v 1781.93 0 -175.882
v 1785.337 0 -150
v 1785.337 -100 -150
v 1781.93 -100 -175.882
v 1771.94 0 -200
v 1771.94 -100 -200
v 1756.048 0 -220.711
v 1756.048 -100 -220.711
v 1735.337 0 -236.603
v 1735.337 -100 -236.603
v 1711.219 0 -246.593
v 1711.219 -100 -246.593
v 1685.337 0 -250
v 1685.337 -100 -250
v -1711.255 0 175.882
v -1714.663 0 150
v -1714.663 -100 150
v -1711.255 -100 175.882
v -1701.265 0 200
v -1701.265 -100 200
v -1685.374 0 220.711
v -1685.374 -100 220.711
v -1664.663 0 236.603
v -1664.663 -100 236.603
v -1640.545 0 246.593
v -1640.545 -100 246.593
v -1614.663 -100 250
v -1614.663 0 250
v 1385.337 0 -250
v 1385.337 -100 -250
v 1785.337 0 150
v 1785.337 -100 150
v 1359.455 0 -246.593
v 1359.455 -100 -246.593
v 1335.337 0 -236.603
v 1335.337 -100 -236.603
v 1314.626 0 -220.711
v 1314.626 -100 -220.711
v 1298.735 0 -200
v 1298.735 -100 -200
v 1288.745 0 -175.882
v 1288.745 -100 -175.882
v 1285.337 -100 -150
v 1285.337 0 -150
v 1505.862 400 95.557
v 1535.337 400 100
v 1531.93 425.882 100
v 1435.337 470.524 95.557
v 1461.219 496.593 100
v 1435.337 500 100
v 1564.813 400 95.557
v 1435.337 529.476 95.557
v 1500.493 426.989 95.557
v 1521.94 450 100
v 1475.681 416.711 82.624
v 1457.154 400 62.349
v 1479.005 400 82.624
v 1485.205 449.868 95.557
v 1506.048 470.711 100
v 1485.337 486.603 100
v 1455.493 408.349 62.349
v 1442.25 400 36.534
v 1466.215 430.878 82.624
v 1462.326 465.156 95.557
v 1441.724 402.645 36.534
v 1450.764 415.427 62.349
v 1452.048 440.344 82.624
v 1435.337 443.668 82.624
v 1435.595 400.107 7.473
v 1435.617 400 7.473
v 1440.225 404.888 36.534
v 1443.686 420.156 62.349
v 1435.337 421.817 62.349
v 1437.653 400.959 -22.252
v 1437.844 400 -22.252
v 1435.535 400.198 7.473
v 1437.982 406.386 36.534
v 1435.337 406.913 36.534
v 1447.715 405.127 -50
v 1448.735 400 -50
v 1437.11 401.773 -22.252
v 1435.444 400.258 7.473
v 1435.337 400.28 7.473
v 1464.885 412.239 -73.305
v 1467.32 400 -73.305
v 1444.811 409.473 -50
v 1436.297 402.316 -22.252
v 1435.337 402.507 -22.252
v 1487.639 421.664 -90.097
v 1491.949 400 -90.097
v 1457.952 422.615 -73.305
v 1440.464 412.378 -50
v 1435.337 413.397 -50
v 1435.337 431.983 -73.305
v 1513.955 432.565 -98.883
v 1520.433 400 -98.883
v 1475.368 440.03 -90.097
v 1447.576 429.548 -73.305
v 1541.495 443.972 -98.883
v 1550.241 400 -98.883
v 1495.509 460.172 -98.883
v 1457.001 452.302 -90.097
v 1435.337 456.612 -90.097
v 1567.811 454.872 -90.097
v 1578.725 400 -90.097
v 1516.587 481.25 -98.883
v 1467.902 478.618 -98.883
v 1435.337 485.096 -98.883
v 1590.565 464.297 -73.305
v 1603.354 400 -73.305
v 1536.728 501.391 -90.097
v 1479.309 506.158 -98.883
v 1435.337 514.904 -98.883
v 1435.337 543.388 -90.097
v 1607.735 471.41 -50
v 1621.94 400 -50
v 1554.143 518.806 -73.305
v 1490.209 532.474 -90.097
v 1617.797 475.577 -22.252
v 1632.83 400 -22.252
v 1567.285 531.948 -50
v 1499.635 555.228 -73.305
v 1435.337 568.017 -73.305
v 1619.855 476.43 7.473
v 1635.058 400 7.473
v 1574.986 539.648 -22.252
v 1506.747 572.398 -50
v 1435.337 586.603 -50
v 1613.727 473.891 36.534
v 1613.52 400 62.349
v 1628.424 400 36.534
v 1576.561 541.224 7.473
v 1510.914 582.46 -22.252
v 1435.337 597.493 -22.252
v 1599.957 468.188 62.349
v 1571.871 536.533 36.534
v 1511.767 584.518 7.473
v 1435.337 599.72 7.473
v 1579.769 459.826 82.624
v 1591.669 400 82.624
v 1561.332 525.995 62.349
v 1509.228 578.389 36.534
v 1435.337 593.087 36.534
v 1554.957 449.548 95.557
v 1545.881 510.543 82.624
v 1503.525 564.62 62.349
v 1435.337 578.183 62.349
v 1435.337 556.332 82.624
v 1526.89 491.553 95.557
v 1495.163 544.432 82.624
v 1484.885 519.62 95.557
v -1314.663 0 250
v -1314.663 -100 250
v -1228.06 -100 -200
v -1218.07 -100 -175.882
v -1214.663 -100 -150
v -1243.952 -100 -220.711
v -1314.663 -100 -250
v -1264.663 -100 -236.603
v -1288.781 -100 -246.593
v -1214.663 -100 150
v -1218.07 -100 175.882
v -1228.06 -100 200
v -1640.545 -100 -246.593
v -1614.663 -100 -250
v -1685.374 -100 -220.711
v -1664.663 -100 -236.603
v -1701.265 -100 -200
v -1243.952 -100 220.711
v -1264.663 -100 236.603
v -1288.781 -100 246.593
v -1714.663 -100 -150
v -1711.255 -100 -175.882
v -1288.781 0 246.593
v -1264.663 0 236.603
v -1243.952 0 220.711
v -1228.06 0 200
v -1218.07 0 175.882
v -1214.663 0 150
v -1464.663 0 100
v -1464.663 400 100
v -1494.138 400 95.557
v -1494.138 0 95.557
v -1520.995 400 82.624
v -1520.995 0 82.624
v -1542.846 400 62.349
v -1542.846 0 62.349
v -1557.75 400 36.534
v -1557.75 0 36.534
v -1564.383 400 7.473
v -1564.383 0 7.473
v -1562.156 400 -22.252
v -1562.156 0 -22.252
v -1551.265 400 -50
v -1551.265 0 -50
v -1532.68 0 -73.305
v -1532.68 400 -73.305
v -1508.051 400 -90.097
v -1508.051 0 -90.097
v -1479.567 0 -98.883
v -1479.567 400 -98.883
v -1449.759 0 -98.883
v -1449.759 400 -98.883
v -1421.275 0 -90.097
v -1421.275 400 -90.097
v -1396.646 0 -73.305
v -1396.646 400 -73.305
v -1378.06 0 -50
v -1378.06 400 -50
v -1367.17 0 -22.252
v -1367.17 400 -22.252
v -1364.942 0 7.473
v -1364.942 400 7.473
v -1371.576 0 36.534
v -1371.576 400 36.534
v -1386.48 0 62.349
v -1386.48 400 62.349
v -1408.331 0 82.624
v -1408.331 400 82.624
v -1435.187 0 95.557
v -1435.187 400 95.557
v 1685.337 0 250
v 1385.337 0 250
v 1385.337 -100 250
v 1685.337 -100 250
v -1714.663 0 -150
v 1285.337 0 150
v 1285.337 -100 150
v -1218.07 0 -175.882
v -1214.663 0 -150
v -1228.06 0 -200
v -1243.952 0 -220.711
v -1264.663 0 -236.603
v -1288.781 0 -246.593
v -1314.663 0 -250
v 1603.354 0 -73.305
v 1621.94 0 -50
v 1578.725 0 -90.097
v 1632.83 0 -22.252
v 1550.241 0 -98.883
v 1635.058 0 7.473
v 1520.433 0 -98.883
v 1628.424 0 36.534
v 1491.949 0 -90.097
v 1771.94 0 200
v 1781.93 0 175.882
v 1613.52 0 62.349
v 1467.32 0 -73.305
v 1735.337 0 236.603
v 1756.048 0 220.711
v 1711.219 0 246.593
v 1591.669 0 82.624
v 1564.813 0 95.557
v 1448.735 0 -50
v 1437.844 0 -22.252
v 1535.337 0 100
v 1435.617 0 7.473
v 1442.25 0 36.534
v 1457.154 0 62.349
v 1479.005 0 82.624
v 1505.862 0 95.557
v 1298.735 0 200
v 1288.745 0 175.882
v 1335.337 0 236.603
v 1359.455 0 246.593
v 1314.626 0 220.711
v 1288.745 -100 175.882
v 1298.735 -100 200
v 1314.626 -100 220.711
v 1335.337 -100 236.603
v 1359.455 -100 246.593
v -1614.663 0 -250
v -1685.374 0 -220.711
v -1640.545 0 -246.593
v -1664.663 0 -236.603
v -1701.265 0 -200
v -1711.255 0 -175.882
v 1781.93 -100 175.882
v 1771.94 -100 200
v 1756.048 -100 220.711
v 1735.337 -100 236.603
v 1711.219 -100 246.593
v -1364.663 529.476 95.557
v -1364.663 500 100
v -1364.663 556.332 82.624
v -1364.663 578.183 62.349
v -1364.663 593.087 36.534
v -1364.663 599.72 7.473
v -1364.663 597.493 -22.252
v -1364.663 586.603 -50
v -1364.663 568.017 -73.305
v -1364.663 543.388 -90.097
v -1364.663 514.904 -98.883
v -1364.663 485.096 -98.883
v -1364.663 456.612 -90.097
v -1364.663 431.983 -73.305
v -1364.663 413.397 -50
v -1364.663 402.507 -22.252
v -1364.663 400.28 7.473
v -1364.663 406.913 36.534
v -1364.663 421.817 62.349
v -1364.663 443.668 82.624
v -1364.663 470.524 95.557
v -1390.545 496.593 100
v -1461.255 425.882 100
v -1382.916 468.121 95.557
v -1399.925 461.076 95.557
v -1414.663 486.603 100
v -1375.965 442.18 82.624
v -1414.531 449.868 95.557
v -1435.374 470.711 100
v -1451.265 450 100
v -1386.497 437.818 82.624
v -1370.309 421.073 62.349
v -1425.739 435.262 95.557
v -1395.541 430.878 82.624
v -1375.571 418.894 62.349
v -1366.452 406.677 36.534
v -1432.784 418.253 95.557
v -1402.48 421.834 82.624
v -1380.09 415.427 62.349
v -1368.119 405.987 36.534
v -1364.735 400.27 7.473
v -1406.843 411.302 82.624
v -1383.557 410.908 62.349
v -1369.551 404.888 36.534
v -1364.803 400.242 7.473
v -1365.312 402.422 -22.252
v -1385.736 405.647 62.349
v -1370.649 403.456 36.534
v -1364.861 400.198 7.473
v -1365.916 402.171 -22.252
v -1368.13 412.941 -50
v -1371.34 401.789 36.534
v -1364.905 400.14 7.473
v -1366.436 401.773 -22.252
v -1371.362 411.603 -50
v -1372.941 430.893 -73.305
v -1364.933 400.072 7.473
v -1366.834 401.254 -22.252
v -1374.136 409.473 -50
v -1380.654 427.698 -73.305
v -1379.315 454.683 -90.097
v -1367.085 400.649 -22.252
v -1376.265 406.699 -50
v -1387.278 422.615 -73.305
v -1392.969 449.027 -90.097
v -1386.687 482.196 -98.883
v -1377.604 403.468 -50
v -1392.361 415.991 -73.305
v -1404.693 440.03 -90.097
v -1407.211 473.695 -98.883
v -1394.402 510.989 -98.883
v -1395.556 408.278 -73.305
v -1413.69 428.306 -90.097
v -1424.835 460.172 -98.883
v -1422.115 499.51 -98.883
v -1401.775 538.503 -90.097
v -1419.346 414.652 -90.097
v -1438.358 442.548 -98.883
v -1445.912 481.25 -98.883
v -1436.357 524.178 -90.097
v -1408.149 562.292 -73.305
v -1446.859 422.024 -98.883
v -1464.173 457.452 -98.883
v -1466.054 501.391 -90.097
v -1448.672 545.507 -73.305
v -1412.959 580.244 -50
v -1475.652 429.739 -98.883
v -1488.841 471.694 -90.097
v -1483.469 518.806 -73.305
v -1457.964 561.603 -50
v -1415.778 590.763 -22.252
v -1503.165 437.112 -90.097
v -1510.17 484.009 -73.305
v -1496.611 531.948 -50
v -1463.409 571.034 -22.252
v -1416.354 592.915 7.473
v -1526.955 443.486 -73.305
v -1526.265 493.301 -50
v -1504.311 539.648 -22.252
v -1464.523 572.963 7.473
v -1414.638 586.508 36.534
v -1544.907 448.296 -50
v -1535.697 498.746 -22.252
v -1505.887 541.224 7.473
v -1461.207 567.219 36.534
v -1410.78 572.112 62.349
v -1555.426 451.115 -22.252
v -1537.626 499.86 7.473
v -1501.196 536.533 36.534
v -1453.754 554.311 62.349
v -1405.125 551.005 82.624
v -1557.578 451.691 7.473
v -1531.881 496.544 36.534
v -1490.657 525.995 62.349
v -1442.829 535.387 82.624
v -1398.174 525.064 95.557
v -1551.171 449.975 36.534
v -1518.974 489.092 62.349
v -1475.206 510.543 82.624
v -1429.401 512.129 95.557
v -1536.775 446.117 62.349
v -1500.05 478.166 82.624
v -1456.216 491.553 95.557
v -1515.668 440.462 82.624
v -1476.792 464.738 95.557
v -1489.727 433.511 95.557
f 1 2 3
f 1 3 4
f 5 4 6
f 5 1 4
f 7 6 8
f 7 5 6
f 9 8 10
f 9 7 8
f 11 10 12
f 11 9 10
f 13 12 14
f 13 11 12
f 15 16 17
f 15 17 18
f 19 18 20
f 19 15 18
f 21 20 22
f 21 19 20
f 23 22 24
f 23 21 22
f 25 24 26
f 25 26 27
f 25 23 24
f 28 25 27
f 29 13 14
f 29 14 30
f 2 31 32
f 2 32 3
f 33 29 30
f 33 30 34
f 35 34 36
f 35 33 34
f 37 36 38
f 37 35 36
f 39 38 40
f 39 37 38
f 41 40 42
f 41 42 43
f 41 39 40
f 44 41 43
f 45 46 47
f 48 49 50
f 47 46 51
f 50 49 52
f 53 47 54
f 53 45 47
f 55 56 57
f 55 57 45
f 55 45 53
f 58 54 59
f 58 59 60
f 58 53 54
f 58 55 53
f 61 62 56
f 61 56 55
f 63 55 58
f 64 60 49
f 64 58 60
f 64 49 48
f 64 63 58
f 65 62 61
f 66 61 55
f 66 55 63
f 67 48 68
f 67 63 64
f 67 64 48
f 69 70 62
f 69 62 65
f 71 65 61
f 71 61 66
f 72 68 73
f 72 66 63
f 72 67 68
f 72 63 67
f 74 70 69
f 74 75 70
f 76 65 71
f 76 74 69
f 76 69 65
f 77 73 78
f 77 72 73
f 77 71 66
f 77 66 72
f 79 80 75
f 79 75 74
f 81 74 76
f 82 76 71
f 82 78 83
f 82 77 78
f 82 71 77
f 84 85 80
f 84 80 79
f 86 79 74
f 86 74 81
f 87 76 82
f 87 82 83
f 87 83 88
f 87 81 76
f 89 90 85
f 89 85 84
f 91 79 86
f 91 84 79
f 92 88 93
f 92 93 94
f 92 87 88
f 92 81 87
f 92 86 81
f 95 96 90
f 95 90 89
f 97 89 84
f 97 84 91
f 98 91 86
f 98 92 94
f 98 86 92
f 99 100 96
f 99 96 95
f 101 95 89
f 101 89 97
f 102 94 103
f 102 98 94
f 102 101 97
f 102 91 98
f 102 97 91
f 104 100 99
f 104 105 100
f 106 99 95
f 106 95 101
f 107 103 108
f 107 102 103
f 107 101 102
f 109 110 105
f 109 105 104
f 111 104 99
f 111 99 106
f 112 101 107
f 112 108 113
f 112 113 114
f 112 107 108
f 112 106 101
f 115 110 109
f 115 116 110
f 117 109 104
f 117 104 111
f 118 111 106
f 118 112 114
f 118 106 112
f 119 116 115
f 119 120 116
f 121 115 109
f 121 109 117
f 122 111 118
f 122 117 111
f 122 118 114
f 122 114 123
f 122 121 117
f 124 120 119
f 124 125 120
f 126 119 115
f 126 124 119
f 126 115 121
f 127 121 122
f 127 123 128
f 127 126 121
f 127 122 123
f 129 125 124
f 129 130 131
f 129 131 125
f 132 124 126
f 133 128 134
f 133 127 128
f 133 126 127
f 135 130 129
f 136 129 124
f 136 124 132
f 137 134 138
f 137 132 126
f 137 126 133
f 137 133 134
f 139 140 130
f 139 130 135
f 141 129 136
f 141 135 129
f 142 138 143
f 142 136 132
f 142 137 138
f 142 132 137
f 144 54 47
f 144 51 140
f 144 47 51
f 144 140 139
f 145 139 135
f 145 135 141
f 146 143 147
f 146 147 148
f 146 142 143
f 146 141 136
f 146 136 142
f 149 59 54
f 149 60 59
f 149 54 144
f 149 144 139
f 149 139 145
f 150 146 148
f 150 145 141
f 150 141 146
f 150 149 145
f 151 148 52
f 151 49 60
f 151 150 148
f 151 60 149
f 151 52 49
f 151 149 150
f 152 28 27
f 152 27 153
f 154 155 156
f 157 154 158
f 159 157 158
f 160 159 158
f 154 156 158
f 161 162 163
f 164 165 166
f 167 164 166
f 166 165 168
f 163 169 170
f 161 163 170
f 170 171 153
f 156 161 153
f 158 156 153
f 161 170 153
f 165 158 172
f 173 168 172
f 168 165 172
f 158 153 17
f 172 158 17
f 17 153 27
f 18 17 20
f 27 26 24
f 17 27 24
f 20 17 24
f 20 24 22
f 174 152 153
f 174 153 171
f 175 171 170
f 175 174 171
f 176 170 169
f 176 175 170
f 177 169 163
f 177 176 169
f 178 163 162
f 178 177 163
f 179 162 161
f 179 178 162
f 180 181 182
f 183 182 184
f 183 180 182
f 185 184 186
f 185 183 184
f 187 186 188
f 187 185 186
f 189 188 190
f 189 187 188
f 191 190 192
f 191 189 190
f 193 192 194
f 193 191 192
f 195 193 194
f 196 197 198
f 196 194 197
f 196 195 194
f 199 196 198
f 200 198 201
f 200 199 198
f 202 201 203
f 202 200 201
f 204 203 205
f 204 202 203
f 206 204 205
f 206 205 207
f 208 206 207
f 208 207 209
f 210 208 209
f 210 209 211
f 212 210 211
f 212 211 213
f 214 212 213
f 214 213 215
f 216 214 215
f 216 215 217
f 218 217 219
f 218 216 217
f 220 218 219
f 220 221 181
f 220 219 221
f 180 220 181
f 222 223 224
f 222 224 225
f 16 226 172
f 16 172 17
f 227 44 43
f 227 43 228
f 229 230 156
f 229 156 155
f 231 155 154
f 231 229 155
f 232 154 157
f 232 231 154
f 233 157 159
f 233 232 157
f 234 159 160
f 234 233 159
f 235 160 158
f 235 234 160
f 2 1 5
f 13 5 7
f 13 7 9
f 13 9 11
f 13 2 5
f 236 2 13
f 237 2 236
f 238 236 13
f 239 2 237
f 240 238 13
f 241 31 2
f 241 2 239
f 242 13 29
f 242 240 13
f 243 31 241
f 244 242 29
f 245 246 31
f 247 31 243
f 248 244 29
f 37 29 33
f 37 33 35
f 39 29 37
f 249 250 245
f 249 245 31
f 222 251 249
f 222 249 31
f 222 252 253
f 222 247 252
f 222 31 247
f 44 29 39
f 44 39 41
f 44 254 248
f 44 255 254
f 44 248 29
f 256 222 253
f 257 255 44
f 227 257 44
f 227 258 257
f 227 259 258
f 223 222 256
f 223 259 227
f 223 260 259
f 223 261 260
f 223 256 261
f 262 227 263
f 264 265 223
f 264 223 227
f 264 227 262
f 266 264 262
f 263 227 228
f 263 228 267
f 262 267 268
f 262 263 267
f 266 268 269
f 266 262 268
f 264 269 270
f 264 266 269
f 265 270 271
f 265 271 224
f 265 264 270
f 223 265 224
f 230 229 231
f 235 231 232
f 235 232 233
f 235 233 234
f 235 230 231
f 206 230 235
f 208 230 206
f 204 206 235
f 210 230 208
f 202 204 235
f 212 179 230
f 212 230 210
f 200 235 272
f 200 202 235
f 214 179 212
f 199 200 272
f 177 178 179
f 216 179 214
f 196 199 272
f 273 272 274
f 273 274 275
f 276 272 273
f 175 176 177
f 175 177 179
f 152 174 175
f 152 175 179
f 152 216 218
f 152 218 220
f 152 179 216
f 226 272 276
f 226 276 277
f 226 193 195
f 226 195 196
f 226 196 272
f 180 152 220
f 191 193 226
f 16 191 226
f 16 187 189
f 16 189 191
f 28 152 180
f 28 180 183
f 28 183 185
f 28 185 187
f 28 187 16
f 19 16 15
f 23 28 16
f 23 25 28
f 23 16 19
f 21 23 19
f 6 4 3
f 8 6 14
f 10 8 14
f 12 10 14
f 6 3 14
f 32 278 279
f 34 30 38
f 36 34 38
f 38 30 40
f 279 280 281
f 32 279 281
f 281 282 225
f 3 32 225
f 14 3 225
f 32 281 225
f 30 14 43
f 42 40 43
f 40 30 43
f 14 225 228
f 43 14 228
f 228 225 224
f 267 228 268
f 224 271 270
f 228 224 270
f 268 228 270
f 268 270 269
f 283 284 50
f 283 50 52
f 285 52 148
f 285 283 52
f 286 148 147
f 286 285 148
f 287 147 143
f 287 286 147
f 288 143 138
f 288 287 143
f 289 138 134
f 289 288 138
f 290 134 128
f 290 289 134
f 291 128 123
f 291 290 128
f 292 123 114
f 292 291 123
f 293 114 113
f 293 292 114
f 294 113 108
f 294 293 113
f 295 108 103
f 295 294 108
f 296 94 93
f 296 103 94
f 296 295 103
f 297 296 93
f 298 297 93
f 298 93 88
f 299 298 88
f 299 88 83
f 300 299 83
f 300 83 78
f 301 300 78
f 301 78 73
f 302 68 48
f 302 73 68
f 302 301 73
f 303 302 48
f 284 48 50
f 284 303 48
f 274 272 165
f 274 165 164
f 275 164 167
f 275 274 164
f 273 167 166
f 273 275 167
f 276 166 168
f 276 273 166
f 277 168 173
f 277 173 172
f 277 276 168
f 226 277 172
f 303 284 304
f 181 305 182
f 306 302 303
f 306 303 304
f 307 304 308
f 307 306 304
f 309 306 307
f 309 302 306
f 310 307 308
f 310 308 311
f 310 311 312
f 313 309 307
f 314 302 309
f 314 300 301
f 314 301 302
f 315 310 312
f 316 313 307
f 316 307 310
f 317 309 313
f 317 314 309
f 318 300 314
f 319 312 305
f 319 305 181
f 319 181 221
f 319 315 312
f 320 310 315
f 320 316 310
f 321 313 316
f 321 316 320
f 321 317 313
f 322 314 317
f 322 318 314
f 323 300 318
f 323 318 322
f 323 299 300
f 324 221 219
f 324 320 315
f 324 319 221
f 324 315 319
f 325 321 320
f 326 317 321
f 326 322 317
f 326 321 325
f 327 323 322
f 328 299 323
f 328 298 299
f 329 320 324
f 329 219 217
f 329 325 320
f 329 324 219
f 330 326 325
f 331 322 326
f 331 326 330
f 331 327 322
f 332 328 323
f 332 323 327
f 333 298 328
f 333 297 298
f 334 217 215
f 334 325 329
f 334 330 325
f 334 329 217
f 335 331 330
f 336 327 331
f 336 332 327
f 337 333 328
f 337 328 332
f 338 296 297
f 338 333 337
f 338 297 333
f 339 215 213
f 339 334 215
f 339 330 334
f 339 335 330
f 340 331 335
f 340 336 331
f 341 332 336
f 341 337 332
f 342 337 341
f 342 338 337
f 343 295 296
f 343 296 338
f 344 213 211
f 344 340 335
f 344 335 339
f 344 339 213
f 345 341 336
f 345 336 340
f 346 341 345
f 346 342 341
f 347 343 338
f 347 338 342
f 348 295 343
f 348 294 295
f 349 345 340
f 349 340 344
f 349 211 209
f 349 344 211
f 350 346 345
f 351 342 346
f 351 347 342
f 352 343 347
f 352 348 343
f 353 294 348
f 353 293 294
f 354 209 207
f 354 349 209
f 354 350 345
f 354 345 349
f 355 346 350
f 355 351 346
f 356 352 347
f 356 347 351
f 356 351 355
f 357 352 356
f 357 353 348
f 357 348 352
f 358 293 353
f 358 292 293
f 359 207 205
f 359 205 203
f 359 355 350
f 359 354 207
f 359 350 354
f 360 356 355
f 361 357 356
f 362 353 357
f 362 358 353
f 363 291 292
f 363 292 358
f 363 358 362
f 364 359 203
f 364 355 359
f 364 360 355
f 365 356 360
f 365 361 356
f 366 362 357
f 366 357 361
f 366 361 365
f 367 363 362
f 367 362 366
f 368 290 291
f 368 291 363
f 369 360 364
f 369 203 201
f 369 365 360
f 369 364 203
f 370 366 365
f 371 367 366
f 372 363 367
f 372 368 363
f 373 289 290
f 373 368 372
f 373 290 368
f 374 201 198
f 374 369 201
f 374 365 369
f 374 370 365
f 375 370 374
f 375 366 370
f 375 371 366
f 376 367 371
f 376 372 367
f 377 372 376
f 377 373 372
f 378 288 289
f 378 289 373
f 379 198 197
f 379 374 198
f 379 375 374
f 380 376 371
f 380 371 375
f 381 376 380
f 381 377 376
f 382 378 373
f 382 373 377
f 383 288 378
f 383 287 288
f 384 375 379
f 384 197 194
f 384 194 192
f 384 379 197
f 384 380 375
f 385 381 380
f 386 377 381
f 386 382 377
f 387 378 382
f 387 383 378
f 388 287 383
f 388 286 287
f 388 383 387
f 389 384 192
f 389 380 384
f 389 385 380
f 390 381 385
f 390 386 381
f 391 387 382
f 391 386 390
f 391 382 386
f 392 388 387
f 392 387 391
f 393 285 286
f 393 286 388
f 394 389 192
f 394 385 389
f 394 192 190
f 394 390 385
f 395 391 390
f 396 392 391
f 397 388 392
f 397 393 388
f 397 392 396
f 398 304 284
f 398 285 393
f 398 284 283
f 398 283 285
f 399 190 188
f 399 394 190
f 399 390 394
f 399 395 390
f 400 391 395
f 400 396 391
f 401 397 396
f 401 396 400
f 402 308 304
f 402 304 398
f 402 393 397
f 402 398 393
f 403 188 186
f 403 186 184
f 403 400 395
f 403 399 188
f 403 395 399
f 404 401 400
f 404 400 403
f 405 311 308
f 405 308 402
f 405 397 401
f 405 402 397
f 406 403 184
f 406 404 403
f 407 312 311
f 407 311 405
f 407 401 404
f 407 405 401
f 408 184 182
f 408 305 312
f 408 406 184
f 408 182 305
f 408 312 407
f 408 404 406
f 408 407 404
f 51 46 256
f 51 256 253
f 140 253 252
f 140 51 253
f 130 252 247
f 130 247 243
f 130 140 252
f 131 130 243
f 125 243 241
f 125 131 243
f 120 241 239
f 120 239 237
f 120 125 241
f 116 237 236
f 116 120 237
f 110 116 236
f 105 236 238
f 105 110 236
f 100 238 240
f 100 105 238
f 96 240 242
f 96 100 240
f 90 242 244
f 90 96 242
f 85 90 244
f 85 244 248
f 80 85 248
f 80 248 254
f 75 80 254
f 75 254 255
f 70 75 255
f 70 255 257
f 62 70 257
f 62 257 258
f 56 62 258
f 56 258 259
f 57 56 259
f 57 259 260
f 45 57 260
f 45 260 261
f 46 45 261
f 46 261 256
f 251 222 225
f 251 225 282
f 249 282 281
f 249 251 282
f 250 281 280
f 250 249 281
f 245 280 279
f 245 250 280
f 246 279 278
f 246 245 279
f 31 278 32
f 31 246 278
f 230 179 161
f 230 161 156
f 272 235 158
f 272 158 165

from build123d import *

# Parameters (mm, degrees)
SWEEP1_PROFILE_R    = 100
BOSS_EXTRUDE1_DEPTH = 100


with BuildPart() as part:
    # Sweep1: sweep along a path in Sketch1
    with BuildLine(Plane.XY) as sweep1_path:
        Line((1535.337124289, 0), (1535.337124289, 400))
        ThreePointArc((1535.337124289, 400), (1506.047802408, 470.710678119), (1435.337124289, 500))
        Line((1435.337124289, 500), (-1364.662875711, 500))
        ThreePointArc((-1364.662875711, 500), (-1435.373553829, 470.710678119), (-1464.662875711, 400))
        Line((-1464.662875711, 400), (-1464.662875711, 0))
    # Sweep1 profile (on start of the path) → Sweep1 (sweep)
    with BuildSketch(Plane(origin=(1535.337124289, 0, 0), x_dir=(0, 0, 1), z_dir=(0, 1, 0))):
        Circle(SWEEP1_PROFILE_R)
    sweep(path=sweep1_path.line)

    # Sketch79 → Boss-Extrude1 (add)
    with BuildSketch(Plane.XZ):
        with BuildLine():
            Line((-1614.662875711, 250), (-1314.662875711, 250))
            ThreePointArc((-1314.662875711, 250), (-1243.952197592, 220.710678119), (-1214.662875711, 150))
            Line((-1214.662875711, 150), (-1214.662875711, -150))
            ThreePointArc((-1214.662875711, -150), (-1243.952197592, -220.710678119), (-1314.662875711, -250))
            Line((-1314.662875711, -250), (-1614.662875711, -250))
            ThreePointArc((-1614.662875711, -250), (-1685.373553829, -220.710678119), (-1714.662875711, -150))
            Line((-1714.662875711, -150), (-1714.662875711, 150))
            ThreePointArc((-1714.662875711, 150), (-1685.373553829, 220.710678119), (-1614.662875711, 250))
        make_face()
        with BuildLine():
            Line((1385.337124289, 250), (1685.337124289, 250))
            ThreePointArc((1685.337124289, 250), (1756.047802408, 220.710678119), (1785.337124289, 150))
            Line((1785.337124289, 150), (1785.337124289, -150))
            ThreePointArc((1785.337124289, -150), (1756.047802408, -220.710678119), (1685.337124289, -250))
            Line((1685.337124289, -250), (1385.337124289, -250))
            ThreePointArc((1385.337124289, -250), (1314.626446171, -220.710678119), (1285.337124289, -150))
            Line((1285.337124289, -150), (1285.337124289, 150))
            ThreePointArc((1285.337124289, 150), (1314.626446171, 220.710678119), (1385.337124289, 250))
        make_face()
    extrude(amount=BOSS_EXTRUDE1_DEPTH)


solid = part.part
